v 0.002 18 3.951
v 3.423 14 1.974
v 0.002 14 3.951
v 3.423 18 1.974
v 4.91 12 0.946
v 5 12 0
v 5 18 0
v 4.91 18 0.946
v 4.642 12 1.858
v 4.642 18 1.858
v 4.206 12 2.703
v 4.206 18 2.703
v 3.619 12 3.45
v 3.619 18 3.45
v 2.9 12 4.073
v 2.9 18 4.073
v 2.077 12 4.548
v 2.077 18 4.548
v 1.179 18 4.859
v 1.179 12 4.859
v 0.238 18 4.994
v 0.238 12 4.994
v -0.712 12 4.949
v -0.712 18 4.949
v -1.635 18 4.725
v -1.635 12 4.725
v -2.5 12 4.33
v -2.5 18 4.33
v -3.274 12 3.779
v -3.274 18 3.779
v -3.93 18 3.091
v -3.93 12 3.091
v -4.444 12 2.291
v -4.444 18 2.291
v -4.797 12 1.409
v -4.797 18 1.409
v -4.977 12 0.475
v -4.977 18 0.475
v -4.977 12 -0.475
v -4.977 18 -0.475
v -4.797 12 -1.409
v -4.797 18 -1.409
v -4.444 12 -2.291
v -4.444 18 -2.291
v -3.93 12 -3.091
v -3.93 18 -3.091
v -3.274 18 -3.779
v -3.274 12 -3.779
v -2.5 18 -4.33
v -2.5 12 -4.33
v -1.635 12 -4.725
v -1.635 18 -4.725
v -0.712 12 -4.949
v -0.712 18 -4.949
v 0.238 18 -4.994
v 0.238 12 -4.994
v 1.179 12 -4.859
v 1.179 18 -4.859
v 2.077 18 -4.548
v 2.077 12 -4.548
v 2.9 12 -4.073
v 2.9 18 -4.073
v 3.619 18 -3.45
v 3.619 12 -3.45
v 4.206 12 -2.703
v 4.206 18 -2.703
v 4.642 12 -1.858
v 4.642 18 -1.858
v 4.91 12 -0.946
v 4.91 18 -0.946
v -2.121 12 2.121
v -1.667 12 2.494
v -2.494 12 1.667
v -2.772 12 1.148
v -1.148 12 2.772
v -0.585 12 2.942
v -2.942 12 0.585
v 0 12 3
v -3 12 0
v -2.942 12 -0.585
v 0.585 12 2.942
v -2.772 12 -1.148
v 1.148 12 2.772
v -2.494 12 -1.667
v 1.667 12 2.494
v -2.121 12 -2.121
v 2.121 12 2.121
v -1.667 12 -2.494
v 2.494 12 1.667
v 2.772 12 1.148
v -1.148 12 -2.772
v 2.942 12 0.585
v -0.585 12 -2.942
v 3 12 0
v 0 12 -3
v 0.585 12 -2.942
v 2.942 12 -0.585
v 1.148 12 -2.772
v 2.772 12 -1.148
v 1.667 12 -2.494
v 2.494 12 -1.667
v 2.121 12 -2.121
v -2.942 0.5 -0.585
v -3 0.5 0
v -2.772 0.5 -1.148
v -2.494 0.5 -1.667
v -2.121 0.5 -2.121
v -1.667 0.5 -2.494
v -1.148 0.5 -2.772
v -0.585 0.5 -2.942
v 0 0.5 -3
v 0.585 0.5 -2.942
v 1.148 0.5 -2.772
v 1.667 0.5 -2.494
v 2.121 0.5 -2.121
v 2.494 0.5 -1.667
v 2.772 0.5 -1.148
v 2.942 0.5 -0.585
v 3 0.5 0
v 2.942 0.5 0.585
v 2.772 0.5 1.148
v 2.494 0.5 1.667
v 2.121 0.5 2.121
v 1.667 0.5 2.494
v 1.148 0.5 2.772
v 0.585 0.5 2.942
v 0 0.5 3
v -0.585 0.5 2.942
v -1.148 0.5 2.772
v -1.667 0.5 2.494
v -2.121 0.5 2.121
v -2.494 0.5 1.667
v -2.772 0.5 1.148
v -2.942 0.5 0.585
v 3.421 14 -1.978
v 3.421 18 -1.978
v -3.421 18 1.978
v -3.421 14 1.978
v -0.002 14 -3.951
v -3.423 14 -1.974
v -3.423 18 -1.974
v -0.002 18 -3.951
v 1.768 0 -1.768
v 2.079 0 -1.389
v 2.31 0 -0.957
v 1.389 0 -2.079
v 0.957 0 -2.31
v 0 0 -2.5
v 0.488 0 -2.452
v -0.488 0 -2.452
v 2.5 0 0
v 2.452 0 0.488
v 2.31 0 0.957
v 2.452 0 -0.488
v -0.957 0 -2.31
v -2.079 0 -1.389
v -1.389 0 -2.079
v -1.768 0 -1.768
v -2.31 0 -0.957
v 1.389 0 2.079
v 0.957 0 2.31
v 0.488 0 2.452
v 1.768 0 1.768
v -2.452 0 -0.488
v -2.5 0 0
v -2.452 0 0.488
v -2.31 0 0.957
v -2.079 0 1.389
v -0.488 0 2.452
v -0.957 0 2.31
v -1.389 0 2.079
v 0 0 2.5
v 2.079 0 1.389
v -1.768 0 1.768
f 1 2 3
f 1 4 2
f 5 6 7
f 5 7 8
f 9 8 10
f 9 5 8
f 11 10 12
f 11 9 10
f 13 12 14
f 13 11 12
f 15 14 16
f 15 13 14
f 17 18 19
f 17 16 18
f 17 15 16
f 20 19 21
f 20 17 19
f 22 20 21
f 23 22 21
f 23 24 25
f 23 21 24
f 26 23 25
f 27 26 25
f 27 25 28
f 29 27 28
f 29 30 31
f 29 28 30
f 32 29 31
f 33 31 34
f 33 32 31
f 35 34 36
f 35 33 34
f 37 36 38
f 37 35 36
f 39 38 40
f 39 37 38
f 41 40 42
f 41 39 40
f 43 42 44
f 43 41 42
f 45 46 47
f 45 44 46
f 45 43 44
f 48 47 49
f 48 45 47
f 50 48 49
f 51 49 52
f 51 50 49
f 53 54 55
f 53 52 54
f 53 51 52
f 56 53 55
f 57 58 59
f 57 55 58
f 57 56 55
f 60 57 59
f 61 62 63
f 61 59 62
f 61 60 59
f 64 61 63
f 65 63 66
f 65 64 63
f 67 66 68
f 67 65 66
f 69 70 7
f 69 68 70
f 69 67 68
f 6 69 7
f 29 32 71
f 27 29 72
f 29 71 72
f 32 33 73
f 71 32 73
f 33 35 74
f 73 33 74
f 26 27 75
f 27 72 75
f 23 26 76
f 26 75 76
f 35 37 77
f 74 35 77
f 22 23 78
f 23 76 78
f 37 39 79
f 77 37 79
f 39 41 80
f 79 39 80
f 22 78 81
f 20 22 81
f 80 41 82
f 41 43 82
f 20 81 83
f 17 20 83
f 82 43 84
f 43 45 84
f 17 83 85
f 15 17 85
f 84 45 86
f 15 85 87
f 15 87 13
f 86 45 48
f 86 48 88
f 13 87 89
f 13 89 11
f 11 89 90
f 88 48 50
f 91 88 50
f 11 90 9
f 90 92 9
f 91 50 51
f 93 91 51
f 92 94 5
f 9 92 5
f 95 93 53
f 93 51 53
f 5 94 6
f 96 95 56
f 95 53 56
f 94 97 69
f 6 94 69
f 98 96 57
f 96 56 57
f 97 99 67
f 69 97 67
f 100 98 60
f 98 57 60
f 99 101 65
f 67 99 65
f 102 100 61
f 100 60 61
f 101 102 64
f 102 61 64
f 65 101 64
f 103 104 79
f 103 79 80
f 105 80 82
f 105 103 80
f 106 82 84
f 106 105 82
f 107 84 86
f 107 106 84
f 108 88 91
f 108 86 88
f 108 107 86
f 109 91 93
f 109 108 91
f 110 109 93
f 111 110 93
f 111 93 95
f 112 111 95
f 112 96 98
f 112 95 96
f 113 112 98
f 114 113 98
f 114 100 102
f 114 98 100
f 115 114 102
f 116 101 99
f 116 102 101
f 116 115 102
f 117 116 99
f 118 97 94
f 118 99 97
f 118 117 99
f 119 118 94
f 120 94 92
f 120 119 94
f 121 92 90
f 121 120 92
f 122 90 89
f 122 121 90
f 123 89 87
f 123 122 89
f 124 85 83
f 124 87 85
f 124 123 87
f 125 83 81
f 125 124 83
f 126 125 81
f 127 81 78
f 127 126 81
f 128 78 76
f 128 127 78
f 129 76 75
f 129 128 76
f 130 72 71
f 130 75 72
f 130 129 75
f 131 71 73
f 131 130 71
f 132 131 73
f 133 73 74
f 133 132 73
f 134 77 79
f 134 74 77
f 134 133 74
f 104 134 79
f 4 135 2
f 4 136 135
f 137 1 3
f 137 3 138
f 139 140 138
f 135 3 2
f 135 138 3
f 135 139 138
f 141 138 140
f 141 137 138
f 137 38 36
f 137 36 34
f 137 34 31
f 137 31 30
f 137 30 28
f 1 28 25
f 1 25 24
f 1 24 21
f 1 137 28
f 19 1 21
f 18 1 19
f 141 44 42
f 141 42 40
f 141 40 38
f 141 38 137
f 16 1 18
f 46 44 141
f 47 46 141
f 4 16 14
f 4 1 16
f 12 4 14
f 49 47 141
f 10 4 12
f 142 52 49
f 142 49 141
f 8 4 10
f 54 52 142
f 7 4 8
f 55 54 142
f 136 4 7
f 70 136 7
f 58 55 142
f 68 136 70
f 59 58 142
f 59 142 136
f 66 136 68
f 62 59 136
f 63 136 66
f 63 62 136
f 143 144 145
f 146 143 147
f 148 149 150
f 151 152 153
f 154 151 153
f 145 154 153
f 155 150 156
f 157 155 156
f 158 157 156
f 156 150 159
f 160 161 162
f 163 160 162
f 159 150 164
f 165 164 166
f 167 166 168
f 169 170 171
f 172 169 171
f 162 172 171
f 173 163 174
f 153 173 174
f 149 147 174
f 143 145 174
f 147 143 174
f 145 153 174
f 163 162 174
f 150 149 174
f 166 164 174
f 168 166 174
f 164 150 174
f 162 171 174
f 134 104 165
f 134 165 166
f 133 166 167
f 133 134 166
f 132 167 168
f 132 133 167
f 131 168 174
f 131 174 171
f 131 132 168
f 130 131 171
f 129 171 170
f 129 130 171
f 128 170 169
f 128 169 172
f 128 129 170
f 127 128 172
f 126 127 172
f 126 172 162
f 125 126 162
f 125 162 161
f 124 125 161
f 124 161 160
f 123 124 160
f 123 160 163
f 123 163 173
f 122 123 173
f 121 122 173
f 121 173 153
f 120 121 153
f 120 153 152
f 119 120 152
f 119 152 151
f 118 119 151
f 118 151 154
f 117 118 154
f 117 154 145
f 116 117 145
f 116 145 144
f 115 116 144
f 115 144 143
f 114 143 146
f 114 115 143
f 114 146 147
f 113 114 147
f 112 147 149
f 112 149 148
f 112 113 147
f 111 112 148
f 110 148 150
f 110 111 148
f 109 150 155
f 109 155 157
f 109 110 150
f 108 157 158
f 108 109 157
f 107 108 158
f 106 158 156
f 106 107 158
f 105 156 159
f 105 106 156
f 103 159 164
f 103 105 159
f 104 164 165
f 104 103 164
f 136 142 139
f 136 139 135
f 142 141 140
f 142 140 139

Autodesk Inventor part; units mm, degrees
ref_plane "YZ Plane" through (0, 0, 0) normal (1, 0, 0) x (0, 1, 0)
ref_plane "XZ Plane" through (0, 0, 0) normal (0, 1, 0) x (-1, 0, 0)
ref_plane "XY Plane" through (0, 0, 0) normal (0, 0, 1) x (1, 0, 0)
sketch "Sketch1" plane through (0, 0, 0) normal (0, 1, 0) x (-1, 0, 0)
  circle A0 centre (0, 0) radius 3
  dimension "d0" = 6
extrude "Extrusion1" add sketch "Sketch1" along normal blind 12
thread "Thread1" size "M6x1" class "6g" standard "ANSI Metric M Profile" full length
chamfer "Chamfer1" distance 0.5 angle 45 1 edges at (3, 0, 0)
sketch "Sketch2" plane through (0, 12, 0) normal (0, 1, 0) x (1, 0, 0)
  circle A0 centre (0, 0) radius 5
  dimension "d8" = 10
extrude "Extrusion2" add sketch "Sketch2" along normal blind 6
sketch "Sketch3" plane through (0, 18, 0) normal (0, 1, 0) x (1, 0, 0)
  line L0 (-3.4231, 1.9737) -> (-0.0023, 3.9513)
  line L1 (-0.0023, 3.9513) -> (3.4208, 1.9776)
  line L2 (3.4208, 1.9776) -> (3.4231, -1.9737)
  line L3 (3.4231, -1.9737) -> (0.0023, -3.9513)
  line L4 (0.0023, -3.9513) -> (-3.4208, -1.9776)
  line L5 (-3.4208, -1.9776) -> (-3.4231, 1.9737)
  point P0 (0, 0)
  point P1 (0, 0)
extrude "Extrusion3" cut sketch "Sketch3" against normal blind 4
properties part number "M6_12mm" material "Steel, Carbon"
